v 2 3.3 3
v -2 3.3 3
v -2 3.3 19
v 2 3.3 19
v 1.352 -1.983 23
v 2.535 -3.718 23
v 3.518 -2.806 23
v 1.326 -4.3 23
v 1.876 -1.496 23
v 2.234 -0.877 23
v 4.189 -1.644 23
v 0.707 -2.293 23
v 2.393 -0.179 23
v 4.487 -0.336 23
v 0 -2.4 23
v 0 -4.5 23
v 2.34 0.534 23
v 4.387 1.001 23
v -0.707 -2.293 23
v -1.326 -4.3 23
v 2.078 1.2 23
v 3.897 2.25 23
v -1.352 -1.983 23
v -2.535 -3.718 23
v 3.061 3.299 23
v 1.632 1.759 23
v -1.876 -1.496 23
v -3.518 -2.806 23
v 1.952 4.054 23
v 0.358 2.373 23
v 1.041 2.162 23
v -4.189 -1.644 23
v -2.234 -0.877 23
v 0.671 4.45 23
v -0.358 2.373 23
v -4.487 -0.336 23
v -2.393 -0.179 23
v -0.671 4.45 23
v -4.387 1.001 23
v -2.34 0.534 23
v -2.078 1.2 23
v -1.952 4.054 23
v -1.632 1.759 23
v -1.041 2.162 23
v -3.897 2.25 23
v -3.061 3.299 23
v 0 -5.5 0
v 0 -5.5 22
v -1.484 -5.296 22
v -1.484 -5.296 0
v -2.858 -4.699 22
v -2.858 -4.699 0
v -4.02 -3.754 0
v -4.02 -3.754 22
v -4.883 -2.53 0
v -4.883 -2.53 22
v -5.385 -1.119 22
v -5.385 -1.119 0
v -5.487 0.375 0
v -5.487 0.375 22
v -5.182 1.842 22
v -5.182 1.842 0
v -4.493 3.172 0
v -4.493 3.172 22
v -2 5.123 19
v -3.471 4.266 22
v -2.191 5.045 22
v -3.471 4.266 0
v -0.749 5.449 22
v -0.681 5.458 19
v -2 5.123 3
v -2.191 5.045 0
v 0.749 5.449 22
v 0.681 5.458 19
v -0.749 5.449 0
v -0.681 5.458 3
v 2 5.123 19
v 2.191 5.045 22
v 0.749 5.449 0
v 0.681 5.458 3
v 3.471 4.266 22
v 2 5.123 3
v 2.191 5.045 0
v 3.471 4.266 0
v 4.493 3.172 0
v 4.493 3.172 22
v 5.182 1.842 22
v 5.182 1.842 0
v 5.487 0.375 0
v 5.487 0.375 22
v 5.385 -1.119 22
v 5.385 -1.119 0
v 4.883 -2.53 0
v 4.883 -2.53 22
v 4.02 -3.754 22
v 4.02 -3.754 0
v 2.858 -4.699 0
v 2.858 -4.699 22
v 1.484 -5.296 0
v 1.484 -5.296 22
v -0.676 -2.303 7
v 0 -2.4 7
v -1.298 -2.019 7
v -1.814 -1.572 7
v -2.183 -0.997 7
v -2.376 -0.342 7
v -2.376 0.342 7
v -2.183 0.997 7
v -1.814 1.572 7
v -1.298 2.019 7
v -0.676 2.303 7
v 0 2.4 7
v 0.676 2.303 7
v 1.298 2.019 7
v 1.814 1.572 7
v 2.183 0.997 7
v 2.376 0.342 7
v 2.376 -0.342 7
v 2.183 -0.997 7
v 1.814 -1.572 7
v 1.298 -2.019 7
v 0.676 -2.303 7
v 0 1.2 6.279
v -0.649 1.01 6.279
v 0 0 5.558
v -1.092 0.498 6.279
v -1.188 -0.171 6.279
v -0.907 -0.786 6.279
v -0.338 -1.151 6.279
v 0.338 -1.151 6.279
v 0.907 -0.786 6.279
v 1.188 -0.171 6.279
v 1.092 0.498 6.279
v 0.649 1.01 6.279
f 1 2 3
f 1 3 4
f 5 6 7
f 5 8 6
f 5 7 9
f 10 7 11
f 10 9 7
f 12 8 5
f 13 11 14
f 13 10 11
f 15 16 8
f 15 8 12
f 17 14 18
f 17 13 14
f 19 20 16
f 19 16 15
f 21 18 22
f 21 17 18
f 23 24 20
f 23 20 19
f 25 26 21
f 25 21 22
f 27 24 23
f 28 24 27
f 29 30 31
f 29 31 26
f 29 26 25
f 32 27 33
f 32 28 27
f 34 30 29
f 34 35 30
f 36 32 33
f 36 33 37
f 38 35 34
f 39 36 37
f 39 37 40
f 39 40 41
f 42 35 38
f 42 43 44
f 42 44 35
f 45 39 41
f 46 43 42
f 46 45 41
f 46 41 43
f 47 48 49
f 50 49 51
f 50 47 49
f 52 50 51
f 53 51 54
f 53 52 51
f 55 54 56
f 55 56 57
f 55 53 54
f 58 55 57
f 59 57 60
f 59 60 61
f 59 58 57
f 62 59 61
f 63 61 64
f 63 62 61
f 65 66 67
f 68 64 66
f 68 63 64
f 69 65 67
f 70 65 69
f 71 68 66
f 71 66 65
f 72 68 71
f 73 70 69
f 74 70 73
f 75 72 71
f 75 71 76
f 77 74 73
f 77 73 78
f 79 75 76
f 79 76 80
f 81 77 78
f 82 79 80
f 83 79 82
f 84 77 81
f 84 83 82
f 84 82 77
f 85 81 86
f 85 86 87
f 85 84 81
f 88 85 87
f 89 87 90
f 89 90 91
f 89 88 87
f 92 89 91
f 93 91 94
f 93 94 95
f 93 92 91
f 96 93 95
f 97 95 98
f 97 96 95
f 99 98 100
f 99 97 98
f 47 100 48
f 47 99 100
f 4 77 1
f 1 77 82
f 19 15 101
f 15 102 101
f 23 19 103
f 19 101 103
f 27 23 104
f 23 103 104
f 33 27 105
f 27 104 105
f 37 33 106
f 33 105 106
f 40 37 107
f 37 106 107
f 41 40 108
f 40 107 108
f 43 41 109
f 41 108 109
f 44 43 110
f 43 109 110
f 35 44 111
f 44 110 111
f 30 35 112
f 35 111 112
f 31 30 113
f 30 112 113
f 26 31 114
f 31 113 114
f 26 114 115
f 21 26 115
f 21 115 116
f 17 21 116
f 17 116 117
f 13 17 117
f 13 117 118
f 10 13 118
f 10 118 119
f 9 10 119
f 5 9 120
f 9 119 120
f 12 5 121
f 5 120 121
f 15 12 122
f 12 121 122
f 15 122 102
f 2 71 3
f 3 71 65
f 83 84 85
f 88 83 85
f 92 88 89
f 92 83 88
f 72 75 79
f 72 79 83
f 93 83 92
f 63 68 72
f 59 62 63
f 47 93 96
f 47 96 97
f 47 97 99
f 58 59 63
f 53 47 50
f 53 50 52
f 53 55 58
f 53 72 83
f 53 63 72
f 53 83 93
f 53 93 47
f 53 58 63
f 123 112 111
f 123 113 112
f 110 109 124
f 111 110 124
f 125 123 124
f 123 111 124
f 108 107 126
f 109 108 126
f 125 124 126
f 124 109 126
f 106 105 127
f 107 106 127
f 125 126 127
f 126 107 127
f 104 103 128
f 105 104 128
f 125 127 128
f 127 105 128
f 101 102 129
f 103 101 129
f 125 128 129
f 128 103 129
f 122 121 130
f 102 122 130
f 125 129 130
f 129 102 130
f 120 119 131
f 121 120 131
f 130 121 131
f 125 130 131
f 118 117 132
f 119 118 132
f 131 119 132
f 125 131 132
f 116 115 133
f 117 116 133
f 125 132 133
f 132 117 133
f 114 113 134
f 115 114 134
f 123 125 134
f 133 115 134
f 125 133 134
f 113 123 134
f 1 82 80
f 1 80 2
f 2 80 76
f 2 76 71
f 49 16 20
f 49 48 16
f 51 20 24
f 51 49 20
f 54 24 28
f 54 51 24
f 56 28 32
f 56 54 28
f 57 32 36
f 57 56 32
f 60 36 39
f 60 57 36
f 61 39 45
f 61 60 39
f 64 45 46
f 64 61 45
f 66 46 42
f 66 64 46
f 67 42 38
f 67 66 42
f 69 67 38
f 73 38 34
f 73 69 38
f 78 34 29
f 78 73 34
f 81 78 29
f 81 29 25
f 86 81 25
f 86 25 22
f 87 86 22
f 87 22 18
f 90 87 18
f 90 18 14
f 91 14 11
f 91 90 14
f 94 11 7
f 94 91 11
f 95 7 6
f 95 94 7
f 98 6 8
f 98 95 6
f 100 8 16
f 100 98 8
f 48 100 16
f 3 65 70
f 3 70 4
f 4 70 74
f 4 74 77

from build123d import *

# Parameters (mm, degrees)
HOLE_WIZARD_M41_D     = 4.8
HOLE_WIZARD_M41_DEPTH = 16
HOLE_WIZARD_M41_TIP   = 1.442065486
CUT_EXTRUDE_1_DEPTH   = 2.2


with BuildPart() as part:
    # Эскиз1 → Повернуть1 (revolve)
    with BuildSketch(Plane(origin=(0, 0, 0), x_dir=(0, 0, -1), z_dir=(1, 0, 0))):
        Polygon((0, 0), (-23, 0), (-23, -4.5), (-22, -5.5), (0, -5.5), align=None)
    revolve(axis=Axis((0, 0, 28.650369954), (0, 0, -1)))

    # Отверстие с зазором M41
    with Locations(Plane(origin=(0, 0, 23), x_dir=(0, 1, 0), z_dir=(0, 0, 1))):
        with Locations((0, 0)):
            Hole(HOLE_WIZARD_M41_D / 2, depth=HOLE_WIZARD_M41_DEPTH)
            with Locations((0, 0, -(HOLE_WIZARD_M41_DEPTH + HOLE_WIZARD_M41_TIP / 2))):  # 118° drill point
                Cone(0, HOLE_WIZARD_M41_D / 2, HOLE_WIZARD_M41_TIP, mode=Mode.SUBTRACT)

    # Эскиз4 → Вырез-Вытянуть1 (cut)
    with BuildSketch(Plane(origin=(0, 5.5, 0), x_dir=(1, 0, 0), z_dir=(0, 1, 0))):
        Polygon((0, -19), (2, -19), (2, -3), (-2, -3), (-2, -19), align=None)
    extrude(amount=-CUT_EXTRUDE_1_DEPTH, mode=Mode.SUBTRACT)


solid = part.part
